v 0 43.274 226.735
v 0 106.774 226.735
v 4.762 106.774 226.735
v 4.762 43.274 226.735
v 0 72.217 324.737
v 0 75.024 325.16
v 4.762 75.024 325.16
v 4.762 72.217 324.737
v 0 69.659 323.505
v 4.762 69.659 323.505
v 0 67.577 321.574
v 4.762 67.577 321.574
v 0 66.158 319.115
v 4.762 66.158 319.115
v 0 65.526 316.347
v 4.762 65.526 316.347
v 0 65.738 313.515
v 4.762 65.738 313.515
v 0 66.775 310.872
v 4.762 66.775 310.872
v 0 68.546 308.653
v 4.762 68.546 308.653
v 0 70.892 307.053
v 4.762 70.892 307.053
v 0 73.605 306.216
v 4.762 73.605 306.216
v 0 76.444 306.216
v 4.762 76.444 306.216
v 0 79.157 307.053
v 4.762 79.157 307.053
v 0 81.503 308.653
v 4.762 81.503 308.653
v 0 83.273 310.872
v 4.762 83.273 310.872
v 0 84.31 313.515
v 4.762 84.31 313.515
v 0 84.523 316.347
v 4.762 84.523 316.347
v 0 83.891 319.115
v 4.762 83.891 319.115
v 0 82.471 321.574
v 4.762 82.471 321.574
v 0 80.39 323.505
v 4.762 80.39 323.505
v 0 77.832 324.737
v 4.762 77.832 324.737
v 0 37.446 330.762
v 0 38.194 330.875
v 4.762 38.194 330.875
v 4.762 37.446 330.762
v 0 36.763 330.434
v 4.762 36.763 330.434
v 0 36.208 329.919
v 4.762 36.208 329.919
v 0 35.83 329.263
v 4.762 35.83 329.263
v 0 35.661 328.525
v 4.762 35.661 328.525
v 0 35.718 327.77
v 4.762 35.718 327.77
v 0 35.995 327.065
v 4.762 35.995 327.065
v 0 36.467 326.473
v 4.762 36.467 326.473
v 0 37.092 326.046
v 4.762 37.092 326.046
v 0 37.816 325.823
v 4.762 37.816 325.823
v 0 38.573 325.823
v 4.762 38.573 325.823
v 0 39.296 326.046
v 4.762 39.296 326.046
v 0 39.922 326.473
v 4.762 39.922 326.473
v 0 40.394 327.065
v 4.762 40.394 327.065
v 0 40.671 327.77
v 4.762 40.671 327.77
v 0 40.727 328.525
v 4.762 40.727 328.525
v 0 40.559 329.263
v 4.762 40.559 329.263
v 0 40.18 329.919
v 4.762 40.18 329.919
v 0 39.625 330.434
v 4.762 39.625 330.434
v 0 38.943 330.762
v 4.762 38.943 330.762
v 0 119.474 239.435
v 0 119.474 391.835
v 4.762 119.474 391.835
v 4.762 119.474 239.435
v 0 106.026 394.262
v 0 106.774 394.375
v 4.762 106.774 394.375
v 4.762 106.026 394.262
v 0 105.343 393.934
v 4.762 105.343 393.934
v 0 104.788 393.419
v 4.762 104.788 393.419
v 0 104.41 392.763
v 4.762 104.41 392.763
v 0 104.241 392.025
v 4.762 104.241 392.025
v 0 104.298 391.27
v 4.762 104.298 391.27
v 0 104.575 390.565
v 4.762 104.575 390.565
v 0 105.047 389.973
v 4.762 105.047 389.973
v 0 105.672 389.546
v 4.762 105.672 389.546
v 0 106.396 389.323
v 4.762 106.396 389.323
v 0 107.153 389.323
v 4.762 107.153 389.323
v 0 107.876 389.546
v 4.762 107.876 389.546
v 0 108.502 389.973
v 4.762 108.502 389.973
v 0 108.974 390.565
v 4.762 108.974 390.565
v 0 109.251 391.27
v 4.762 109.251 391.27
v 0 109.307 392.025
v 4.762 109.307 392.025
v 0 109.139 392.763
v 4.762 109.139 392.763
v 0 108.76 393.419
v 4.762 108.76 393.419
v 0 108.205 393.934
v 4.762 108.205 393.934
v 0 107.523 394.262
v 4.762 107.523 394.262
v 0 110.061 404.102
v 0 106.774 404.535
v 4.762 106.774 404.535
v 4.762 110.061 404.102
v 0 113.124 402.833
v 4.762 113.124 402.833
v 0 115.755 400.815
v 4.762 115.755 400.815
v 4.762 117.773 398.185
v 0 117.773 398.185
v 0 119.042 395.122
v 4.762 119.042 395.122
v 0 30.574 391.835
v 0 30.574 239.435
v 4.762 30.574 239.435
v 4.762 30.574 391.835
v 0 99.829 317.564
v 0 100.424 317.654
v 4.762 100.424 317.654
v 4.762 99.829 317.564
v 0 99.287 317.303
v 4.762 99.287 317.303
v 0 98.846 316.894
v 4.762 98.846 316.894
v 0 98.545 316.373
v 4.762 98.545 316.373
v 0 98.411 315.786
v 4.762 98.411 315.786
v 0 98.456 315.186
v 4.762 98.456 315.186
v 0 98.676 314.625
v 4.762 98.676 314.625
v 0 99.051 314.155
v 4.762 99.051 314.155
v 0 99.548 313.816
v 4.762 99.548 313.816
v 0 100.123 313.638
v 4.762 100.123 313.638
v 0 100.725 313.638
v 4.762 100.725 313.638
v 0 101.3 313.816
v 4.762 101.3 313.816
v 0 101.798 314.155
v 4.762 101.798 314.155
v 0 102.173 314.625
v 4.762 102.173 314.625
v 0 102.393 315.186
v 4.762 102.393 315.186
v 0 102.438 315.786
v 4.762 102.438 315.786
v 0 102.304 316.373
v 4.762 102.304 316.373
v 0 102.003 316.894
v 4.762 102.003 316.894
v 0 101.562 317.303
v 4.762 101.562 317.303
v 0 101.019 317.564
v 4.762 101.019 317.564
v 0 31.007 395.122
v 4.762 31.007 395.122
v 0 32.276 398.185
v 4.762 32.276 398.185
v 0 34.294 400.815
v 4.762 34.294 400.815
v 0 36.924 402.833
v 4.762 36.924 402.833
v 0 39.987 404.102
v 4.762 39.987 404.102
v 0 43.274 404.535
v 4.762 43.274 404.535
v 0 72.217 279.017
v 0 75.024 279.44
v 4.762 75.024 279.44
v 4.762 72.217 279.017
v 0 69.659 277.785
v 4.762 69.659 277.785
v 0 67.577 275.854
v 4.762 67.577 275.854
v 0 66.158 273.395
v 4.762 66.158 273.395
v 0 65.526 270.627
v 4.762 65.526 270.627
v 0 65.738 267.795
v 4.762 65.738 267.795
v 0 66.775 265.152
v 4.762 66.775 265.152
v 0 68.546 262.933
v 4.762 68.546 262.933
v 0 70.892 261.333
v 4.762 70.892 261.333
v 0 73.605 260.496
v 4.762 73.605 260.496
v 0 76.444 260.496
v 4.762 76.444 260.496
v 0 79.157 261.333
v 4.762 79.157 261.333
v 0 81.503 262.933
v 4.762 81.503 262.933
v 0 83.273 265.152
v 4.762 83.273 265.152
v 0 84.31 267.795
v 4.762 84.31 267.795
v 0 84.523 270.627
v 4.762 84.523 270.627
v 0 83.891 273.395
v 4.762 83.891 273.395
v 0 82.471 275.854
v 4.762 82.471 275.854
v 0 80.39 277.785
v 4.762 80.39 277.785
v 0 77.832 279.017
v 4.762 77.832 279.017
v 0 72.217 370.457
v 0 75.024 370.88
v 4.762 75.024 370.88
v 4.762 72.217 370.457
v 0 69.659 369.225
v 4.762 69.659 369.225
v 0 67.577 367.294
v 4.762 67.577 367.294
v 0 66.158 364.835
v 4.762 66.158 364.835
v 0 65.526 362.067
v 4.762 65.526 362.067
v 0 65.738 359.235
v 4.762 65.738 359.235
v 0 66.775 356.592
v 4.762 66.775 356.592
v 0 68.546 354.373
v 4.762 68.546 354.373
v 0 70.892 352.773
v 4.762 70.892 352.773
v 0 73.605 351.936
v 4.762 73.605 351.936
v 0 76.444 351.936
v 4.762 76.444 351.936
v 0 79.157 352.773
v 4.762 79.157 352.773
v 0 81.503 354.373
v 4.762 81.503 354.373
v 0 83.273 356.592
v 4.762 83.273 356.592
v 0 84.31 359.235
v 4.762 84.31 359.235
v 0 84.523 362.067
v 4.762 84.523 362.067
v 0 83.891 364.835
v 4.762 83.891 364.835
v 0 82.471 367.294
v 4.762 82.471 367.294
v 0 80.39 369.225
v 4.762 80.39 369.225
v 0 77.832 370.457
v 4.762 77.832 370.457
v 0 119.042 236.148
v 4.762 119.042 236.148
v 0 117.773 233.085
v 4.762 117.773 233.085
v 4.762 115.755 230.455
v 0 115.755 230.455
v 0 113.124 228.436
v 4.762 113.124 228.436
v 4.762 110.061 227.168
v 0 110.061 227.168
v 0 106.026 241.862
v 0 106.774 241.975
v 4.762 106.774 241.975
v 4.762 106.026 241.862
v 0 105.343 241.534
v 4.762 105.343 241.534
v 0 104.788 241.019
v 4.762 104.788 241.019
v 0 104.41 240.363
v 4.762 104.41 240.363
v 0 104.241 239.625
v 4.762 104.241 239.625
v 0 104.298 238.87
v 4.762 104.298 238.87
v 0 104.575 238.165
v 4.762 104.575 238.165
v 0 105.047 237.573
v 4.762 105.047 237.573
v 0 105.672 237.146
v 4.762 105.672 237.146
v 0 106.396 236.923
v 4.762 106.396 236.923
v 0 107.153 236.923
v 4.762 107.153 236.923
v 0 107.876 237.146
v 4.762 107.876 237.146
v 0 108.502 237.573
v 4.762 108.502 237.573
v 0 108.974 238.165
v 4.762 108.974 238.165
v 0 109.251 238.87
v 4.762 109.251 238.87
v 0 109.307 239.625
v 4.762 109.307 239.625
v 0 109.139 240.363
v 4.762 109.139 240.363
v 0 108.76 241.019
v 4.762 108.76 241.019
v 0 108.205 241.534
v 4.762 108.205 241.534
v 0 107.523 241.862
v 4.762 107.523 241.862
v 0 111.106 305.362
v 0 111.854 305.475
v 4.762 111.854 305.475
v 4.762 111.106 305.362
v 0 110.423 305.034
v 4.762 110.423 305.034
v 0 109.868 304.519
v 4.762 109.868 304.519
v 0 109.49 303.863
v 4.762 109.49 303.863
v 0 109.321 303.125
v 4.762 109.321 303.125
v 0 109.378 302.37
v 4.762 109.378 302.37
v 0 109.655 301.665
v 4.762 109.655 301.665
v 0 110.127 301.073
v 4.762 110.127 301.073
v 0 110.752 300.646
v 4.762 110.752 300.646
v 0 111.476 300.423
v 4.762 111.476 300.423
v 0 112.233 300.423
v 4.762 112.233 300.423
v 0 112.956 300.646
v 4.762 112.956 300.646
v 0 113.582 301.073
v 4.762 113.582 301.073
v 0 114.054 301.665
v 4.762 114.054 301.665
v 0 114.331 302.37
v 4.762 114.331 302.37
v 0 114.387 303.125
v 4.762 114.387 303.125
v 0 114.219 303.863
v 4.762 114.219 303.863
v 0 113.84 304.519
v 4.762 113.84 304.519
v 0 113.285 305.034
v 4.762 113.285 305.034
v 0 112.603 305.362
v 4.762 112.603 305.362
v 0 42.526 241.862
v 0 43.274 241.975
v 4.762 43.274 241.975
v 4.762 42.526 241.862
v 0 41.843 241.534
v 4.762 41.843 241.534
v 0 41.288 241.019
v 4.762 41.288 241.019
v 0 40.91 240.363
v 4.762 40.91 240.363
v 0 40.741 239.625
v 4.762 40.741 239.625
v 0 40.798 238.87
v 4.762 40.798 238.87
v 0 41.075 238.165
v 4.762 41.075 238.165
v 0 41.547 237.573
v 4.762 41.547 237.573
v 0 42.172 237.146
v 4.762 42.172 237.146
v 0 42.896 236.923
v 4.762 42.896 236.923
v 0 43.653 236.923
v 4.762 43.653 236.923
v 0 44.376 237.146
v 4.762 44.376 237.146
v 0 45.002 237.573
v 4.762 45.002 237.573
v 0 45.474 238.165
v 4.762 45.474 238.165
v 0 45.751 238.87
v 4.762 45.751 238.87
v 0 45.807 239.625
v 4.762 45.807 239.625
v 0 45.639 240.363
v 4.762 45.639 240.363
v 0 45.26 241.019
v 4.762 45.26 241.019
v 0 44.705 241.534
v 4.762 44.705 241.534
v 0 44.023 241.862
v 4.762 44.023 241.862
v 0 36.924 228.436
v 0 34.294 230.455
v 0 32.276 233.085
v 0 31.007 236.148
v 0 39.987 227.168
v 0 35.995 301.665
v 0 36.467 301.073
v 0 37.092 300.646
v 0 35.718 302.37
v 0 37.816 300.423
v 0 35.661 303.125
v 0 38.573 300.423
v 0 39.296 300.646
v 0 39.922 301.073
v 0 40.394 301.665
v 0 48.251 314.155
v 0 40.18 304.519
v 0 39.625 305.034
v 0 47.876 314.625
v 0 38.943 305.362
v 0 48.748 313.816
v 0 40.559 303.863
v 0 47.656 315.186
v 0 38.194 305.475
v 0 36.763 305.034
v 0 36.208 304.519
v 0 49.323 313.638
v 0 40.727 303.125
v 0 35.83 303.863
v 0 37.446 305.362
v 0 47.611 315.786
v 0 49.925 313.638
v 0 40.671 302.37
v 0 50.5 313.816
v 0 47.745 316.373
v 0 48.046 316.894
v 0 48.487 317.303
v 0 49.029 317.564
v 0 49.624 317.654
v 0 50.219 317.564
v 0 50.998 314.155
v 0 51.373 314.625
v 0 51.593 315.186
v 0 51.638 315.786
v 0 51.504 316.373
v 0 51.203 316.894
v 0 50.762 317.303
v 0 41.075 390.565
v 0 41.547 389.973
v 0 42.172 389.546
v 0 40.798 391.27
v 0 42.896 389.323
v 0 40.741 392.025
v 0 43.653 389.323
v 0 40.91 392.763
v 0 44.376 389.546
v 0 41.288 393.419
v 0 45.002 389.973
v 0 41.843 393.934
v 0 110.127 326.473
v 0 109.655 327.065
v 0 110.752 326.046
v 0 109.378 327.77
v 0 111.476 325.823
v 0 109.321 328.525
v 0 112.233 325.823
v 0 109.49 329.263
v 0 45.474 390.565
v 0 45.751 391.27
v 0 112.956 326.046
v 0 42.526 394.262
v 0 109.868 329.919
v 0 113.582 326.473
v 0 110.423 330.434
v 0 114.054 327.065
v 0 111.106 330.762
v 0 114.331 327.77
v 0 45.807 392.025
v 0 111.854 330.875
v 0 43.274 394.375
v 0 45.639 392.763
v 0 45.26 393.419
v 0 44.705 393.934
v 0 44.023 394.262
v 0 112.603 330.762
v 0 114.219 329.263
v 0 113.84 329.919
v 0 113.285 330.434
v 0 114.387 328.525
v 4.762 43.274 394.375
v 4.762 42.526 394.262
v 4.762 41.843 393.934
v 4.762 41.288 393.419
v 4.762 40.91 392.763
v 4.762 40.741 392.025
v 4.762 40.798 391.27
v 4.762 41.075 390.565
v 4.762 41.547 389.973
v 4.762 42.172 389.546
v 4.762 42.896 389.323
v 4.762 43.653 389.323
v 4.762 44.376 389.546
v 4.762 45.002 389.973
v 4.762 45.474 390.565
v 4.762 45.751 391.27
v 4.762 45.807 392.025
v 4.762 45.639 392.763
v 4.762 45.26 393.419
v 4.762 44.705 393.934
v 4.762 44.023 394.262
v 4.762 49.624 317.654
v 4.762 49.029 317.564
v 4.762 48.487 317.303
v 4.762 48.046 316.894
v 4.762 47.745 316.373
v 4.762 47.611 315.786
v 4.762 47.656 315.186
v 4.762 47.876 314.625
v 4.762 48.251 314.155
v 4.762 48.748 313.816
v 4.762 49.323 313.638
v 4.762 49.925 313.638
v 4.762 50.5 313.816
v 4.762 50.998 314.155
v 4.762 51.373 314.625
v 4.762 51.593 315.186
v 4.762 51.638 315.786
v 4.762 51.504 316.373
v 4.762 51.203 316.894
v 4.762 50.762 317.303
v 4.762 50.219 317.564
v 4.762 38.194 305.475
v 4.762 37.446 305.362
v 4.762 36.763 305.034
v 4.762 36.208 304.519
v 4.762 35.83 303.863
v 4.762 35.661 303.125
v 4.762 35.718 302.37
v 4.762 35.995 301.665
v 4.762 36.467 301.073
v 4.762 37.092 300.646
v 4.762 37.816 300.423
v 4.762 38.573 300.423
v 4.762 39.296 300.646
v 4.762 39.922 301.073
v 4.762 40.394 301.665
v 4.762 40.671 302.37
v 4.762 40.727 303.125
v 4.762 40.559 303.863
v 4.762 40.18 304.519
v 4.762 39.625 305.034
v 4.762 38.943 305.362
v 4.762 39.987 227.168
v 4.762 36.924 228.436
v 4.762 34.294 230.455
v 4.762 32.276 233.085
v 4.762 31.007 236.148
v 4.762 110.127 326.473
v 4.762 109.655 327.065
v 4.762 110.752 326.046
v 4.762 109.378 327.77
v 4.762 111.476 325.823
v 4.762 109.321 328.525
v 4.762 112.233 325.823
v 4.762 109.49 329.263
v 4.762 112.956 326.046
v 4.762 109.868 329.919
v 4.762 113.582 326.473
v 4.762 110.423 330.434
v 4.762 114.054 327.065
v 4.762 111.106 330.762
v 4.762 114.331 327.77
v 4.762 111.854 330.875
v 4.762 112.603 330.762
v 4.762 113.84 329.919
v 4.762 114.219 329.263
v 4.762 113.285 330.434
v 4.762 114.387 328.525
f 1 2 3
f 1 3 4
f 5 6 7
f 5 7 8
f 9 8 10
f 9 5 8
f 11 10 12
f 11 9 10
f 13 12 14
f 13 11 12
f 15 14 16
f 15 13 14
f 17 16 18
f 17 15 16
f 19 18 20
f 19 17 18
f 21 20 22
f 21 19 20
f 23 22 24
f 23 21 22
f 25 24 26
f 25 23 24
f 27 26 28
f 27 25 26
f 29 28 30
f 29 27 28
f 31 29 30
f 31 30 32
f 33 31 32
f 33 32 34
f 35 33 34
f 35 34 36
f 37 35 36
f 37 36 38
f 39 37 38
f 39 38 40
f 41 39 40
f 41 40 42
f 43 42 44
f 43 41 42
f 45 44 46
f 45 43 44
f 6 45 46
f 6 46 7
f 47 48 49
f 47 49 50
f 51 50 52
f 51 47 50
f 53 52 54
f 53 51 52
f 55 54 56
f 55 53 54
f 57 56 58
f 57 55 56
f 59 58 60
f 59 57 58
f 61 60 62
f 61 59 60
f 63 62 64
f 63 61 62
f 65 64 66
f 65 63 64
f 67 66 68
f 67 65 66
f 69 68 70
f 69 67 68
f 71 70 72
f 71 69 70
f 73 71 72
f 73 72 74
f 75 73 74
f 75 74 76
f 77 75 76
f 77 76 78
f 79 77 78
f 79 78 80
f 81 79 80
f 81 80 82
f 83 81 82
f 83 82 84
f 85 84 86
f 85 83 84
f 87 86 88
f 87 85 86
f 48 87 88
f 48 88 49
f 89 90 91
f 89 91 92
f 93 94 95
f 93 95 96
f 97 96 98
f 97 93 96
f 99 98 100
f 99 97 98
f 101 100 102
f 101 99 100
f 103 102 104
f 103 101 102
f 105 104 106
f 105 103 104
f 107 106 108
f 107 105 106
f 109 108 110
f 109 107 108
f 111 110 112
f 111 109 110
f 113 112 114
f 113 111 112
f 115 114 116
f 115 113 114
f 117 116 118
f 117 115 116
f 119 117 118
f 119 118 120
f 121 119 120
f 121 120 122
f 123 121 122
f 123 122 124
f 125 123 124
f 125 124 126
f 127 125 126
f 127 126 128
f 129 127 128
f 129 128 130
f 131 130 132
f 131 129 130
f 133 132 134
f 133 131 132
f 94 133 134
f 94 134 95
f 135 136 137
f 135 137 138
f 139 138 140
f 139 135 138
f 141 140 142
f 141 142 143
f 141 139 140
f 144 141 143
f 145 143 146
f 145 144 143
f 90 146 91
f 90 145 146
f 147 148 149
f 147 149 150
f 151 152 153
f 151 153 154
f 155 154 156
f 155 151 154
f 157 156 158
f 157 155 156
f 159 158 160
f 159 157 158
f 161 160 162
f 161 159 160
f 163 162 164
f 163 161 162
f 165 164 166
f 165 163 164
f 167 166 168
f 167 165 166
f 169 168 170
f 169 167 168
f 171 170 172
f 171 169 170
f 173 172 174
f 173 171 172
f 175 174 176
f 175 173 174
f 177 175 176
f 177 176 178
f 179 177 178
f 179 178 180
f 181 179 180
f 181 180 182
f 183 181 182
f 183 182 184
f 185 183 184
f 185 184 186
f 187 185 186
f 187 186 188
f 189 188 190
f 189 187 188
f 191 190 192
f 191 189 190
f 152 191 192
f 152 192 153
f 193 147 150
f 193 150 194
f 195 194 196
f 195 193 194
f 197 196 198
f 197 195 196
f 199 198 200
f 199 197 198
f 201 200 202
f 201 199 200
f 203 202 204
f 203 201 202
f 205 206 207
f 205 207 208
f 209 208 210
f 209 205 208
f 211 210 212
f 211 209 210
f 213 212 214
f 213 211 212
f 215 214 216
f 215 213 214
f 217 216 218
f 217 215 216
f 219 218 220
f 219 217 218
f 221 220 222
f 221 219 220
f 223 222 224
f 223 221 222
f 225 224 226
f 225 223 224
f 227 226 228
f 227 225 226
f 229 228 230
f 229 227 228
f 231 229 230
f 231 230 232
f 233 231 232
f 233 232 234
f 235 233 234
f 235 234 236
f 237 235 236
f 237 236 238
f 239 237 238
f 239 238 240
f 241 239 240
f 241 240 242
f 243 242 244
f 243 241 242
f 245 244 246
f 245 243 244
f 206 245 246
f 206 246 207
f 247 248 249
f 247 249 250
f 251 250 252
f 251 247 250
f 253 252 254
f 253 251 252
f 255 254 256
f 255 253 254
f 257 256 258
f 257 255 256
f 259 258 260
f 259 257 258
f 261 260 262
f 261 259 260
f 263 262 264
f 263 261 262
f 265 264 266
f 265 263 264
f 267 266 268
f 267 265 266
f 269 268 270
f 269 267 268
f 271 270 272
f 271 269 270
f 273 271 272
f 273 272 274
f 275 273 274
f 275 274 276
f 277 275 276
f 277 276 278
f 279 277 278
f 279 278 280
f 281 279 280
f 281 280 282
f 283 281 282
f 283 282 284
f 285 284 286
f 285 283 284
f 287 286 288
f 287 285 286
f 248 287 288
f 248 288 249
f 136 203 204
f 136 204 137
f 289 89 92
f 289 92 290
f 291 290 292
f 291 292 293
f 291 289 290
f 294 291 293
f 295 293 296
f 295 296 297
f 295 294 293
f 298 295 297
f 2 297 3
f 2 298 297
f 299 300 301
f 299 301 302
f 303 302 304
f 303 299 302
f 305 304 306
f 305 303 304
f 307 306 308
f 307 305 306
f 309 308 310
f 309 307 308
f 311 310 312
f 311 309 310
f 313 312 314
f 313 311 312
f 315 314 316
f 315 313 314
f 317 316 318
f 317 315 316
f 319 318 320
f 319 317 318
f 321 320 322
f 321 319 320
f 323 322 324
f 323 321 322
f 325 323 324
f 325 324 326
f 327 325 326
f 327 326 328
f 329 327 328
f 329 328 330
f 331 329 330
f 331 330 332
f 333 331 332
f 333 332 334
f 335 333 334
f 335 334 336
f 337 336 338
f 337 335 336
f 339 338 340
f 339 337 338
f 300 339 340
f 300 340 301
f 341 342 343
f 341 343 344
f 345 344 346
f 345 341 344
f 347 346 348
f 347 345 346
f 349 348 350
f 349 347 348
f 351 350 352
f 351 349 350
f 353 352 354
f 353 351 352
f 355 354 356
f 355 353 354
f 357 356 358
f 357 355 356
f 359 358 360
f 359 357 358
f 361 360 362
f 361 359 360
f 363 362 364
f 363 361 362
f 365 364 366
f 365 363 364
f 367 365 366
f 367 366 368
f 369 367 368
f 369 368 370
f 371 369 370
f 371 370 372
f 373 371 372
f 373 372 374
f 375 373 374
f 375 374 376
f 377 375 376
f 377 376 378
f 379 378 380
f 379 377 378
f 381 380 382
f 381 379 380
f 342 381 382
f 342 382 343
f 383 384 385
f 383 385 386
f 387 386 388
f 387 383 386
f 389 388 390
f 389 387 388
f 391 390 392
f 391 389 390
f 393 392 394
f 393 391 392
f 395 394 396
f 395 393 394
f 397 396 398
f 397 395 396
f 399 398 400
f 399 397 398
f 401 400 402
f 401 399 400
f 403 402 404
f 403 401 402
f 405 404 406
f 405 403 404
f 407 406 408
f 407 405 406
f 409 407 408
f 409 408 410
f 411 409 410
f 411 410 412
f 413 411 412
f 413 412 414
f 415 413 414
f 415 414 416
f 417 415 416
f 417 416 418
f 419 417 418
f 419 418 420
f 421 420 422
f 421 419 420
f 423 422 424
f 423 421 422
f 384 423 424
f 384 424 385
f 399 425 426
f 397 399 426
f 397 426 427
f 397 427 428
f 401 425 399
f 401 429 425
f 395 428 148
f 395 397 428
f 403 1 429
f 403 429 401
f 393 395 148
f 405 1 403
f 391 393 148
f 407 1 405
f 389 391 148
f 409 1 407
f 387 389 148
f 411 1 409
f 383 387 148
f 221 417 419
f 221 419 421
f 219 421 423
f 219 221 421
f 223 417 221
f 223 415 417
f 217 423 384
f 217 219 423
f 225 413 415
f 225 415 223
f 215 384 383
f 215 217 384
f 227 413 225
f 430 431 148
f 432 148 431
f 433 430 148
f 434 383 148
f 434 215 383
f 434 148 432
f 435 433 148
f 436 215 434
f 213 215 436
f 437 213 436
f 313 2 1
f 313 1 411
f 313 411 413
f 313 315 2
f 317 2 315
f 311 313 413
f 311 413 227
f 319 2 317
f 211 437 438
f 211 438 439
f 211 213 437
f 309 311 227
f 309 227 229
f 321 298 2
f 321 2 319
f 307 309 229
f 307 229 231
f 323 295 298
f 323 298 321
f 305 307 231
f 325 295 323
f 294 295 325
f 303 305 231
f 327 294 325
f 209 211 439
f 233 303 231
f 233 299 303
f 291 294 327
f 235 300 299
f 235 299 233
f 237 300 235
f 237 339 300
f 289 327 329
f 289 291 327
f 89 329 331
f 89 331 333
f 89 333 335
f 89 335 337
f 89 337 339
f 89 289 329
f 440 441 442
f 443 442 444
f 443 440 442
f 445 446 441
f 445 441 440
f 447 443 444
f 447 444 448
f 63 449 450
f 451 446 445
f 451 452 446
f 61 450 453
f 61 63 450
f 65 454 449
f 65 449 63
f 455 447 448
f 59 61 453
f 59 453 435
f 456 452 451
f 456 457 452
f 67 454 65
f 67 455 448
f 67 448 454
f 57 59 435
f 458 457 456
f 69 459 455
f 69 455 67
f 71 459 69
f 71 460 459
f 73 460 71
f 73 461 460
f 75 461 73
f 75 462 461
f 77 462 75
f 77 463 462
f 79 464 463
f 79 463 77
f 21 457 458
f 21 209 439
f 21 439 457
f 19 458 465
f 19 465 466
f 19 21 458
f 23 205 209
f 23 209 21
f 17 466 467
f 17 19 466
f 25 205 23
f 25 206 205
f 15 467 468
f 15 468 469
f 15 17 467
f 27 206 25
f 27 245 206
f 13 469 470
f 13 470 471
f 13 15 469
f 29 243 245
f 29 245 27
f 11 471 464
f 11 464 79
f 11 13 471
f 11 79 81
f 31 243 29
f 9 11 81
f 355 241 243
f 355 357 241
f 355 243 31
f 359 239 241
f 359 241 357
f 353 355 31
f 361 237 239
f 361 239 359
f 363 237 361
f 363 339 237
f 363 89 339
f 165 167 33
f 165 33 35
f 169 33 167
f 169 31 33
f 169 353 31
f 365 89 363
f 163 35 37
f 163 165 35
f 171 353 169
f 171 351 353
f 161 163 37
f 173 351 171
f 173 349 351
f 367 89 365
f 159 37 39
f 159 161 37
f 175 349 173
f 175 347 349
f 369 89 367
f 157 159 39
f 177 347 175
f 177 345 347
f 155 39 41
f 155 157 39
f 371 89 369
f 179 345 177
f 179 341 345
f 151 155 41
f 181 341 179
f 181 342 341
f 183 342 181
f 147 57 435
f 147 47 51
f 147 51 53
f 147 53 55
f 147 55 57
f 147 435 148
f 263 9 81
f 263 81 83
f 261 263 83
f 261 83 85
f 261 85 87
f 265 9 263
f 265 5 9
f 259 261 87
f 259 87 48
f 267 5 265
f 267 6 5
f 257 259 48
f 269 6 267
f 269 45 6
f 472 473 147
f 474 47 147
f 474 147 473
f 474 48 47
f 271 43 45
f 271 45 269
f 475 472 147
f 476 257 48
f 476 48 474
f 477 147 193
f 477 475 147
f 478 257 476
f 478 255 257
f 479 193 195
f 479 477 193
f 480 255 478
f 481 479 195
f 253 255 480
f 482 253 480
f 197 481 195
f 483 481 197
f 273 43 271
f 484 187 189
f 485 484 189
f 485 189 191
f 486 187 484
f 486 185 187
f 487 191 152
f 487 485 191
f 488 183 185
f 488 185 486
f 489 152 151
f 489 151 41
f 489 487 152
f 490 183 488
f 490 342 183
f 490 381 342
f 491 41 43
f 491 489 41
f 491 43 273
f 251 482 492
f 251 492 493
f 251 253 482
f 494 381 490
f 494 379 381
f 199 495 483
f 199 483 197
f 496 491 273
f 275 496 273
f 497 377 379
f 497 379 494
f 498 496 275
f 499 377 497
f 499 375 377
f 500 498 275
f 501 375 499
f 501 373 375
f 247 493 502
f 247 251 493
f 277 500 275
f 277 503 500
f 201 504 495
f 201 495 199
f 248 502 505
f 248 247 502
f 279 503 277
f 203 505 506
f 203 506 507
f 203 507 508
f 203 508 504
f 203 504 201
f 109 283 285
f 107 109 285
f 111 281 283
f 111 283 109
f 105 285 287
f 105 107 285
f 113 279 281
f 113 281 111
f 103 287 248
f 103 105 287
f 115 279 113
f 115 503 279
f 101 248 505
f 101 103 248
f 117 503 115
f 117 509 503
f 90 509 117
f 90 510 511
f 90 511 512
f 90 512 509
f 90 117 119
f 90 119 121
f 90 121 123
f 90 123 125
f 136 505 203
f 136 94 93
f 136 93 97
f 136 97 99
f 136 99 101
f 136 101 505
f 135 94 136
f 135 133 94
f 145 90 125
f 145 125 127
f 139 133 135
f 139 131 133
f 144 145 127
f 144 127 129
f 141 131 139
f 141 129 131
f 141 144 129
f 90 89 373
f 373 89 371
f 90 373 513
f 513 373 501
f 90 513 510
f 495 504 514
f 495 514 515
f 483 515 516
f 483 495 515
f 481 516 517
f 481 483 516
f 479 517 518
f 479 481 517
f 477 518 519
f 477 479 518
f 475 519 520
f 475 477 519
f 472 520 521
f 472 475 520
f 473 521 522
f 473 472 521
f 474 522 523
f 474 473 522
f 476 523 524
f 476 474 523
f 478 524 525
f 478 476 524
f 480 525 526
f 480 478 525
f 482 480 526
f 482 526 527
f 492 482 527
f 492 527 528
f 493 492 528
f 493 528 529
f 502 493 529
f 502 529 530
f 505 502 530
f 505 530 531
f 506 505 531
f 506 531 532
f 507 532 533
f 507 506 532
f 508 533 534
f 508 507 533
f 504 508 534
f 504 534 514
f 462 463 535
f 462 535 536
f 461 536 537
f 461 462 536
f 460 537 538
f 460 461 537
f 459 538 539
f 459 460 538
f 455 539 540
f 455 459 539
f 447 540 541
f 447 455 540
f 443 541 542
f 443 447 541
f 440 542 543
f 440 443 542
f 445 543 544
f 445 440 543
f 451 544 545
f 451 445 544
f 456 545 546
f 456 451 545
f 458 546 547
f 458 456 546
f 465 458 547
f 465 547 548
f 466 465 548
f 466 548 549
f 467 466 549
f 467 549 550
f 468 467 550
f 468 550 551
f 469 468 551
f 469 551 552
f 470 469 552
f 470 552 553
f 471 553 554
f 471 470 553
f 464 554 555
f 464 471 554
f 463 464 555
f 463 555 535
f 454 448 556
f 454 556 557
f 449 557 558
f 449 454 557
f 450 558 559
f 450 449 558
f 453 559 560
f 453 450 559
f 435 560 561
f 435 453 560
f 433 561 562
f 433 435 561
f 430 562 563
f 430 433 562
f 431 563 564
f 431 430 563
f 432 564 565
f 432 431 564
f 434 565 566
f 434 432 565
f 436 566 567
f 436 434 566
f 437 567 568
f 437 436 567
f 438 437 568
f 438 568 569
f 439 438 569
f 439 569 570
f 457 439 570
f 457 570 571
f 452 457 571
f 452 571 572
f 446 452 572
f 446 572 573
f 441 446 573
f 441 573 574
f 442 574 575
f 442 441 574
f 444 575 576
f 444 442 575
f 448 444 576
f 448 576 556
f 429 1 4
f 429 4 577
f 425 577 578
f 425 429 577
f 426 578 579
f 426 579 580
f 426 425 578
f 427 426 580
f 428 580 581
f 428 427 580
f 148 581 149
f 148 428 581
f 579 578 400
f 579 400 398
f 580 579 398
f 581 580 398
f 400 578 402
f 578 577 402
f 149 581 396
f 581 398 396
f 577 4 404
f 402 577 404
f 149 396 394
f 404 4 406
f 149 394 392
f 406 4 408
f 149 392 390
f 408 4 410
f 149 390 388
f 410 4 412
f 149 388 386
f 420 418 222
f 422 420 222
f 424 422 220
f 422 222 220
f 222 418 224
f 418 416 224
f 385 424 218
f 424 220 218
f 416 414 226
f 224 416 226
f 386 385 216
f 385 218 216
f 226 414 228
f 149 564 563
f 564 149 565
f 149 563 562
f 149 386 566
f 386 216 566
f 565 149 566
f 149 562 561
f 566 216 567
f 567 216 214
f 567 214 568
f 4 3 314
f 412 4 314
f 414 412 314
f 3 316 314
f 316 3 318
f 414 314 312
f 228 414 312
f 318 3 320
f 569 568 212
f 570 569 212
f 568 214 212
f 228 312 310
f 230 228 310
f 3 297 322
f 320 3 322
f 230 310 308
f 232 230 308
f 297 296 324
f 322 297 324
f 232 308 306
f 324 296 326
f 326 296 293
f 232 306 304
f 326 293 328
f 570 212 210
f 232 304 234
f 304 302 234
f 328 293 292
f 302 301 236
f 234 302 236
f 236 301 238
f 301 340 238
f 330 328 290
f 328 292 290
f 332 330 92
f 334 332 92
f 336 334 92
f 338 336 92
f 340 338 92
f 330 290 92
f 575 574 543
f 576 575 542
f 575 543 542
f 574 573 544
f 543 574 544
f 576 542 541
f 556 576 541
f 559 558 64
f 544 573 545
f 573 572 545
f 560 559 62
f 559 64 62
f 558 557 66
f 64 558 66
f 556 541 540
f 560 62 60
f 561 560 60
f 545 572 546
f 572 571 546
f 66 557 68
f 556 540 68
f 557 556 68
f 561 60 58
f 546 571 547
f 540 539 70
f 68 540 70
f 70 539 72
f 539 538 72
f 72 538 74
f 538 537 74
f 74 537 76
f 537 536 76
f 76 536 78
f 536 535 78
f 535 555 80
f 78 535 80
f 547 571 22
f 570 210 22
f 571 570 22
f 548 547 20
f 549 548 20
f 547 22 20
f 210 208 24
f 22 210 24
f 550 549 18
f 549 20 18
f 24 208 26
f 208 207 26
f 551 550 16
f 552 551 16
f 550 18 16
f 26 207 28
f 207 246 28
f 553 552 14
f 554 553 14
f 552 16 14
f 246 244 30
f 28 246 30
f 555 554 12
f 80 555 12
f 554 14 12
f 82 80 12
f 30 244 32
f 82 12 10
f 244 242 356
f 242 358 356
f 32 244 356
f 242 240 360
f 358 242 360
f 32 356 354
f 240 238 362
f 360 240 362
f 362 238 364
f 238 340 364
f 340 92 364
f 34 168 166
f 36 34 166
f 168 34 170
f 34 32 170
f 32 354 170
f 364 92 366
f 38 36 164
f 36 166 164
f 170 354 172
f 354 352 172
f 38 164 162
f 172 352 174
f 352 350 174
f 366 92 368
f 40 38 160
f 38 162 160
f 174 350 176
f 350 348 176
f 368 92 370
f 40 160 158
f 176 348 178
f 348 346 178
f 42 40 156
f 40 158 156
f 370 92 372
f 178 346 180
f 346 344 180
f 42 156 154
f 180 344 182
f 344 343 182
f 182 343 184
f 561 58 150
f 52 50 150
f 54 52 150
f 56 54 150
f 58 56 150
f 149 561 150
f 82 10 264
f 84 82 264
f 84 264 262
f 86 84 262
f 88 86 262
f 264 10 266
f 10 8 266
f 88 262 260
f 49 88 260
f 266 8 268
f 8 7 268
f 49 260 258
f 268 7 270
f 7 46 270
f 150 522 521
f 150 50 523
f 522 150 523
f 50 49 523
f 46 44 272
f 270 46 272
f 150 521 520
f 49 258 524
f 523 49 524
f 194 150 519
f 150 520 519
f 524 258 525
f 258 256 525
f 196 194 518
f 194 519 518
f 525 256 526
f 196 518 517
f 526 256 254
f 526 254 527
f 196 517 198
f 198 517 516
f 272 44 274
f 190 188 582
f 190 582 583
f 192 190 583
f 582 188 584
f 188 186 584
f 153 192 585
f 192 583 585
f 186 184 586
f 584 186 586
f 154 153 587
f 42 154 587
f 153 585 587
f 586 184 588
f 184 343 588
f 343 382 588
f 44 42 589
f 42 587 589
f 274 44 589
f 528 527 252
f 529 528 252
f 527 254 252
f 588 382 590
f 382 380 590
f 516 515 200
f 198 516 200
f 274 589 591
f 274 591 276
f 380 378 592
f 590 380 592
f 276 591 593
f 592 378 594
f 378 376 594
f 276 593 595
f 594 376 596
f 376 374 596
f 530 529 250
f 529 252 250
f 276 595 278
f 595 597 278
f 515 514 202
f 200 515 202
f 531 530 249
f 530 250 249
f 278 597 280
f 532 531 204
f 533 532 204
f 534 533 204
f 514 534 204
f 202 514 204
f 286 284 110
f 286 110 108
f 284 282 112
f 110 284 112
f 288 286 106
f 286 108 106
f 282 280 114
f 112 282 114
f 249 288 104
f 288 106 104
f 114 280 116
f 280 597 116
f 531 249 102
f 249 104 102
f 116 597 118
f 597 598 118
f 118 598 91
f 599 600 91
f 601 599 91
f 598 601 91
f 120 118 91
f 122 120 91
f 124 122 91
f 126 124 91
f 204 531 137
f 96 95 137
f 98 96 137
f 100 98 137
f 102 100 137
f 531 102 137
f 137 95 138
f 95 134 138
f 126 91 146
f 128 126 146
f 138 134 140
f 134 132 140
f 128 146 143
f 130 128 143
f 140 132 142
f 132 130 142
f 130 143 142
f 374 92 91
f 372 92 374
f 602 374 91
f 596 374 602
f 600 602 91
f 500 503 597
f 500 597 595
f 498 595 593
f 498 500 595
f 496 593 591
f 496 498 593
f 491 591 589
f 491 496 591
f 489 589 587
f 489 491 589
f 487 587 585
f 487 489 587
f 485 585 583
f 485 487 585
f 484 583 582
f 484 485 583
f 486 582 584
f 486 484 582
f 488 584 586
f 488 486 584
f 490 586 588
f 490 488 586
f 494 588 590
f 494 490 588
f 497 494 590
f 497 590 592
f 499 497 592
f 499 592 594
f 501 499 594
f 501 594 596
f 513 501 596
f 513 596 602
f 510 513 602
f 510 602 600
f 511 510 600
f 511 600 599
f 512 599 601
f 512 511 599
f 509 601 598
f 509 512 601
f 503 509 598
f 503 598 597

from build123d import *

# Parameters (mm, degrees)
SKETCH1_R           = 2.54
SKETCH1_R_2         = 2.0193
SKETCH1_R_3         = 9.525
BOSS_EXTRUDE1_DEPTH = 4.7625


with BuildPart() as part:
    # Sketch1 → Boss-Extrude1 (new body)
    with BuildSketch(Plane(origin=(0, 0, 0), x_dir=(0, 0, -1), z_dir=(1, 0, 0))):
        with BuildLine():
            Line((226.734866781, 43.274288567), (226.734866781, 106.774288567))
            ThreePointArc((226.734866781, 106.774288567), (230.45461066, 115.754544688), (239.434866781, 119.474288567))
            Line((239.434866781, 119.474288567), (391.834866781, 119.474288567))
            ThreePointArc((391.834866781, 119.474288567), (400.815122902, 115.754544688), (404.534866781, 106.774288567))
            Line((404.534866781, 106.774288567), (404.534866781, 43.274288567))
            ThreePointArc((404.534866781, 43.274288567), (400.815122902, 34.294032445), (391.834866781, 30.574288567))
            Line((391.834866781, 30.574288567), (239.434866781, 30.574288567))
            ThreePointArc((239.434866781, 30.574288567), (230.45461066, 34.294032445), (226.734866781, 43.274288567))
        make_face()
        with Locations(Location((302.934866781, 111.854288567, 0), (0, 0, 180))):
            Circle(SKETCH1_R, mode=Mode.SUBTRACT)
        with Locations(Location((328.334866781, 111.854288567, 0), (0, 0, 180))):
            Circle(SKETCH1_R, mode=Mode.SUBTRACT)
        with Locations(Location((315.634866781, 100.424288567, 0), (0, 0, 180))):
            Circle(SKETCH1_R_2, mode=Mode.SUBTRACT)
        with Locations(Location((302.934866781, 38.194288567, 0), (0, 0, 180))):
            Circle(SKETCH1_R, mode=Mode.SUBTRACT)
        with Locations(Location((328.334866781, 38.194288567, 0), (0, 0, 180))):
            Circle(SKETCH1_R, mode=Mode.SUBTRACT)
        with Locations(Location((239.434866781, 43.274288567, 0), (0, 0, 180))):
            Circle(SKETCH1_R, mode=Mode.SUBTRACT)
        with Locations(Location((391.834866781, 43.274288567, 0), (0, 0, 180))):
            Circle(SKETCH1_R, mode=Mode.SUBTRACT)
        with Locations(Location((315.634866781, 75.024288567, 0), (0, 0, 180))):
            Circle(SKETCH1_R_3, mode=Mode.SUBTRACT)
        with Locations(Location((315.634866781, 49.624288567, 0), (0, 0, 180))):
            Circle(SKETCH1_R_2, mode=Mode.SUBTRACT)
        with Locations(Location((239.434866781, 106.774288567, 0), (0, 0, 180))):
            Circle(SKETCH1_R, mode=Mode.SUBTRACT)
        with Locations(Location((391.834866781, 106.774288567, 0), (0, 0, 180))):
            Circle(SKETCH1_R, mode=Mode.SUBTRACT)
        with Locations(Location((269.914866781, 75.024288567, 0), (0, 0, 180))):
            Circle(SKETCH1_R_3, mode=Mode.SUBTRACT)
        with Locations(Location((361.354866781, 75.024288567, 0), (0, 0, 180))):
            Circle(SKETCH1_R_3, mode=Mode.SUBTRACT)
    extrude(amount=BOSS_EXTRUDE1_DEPTH)


with BuildPart() as part_1:
    # Body-Move/Copy1: moved
    add(part.part.moved(Location((0, 0, 631.269733563))))


solid = part_1.part
